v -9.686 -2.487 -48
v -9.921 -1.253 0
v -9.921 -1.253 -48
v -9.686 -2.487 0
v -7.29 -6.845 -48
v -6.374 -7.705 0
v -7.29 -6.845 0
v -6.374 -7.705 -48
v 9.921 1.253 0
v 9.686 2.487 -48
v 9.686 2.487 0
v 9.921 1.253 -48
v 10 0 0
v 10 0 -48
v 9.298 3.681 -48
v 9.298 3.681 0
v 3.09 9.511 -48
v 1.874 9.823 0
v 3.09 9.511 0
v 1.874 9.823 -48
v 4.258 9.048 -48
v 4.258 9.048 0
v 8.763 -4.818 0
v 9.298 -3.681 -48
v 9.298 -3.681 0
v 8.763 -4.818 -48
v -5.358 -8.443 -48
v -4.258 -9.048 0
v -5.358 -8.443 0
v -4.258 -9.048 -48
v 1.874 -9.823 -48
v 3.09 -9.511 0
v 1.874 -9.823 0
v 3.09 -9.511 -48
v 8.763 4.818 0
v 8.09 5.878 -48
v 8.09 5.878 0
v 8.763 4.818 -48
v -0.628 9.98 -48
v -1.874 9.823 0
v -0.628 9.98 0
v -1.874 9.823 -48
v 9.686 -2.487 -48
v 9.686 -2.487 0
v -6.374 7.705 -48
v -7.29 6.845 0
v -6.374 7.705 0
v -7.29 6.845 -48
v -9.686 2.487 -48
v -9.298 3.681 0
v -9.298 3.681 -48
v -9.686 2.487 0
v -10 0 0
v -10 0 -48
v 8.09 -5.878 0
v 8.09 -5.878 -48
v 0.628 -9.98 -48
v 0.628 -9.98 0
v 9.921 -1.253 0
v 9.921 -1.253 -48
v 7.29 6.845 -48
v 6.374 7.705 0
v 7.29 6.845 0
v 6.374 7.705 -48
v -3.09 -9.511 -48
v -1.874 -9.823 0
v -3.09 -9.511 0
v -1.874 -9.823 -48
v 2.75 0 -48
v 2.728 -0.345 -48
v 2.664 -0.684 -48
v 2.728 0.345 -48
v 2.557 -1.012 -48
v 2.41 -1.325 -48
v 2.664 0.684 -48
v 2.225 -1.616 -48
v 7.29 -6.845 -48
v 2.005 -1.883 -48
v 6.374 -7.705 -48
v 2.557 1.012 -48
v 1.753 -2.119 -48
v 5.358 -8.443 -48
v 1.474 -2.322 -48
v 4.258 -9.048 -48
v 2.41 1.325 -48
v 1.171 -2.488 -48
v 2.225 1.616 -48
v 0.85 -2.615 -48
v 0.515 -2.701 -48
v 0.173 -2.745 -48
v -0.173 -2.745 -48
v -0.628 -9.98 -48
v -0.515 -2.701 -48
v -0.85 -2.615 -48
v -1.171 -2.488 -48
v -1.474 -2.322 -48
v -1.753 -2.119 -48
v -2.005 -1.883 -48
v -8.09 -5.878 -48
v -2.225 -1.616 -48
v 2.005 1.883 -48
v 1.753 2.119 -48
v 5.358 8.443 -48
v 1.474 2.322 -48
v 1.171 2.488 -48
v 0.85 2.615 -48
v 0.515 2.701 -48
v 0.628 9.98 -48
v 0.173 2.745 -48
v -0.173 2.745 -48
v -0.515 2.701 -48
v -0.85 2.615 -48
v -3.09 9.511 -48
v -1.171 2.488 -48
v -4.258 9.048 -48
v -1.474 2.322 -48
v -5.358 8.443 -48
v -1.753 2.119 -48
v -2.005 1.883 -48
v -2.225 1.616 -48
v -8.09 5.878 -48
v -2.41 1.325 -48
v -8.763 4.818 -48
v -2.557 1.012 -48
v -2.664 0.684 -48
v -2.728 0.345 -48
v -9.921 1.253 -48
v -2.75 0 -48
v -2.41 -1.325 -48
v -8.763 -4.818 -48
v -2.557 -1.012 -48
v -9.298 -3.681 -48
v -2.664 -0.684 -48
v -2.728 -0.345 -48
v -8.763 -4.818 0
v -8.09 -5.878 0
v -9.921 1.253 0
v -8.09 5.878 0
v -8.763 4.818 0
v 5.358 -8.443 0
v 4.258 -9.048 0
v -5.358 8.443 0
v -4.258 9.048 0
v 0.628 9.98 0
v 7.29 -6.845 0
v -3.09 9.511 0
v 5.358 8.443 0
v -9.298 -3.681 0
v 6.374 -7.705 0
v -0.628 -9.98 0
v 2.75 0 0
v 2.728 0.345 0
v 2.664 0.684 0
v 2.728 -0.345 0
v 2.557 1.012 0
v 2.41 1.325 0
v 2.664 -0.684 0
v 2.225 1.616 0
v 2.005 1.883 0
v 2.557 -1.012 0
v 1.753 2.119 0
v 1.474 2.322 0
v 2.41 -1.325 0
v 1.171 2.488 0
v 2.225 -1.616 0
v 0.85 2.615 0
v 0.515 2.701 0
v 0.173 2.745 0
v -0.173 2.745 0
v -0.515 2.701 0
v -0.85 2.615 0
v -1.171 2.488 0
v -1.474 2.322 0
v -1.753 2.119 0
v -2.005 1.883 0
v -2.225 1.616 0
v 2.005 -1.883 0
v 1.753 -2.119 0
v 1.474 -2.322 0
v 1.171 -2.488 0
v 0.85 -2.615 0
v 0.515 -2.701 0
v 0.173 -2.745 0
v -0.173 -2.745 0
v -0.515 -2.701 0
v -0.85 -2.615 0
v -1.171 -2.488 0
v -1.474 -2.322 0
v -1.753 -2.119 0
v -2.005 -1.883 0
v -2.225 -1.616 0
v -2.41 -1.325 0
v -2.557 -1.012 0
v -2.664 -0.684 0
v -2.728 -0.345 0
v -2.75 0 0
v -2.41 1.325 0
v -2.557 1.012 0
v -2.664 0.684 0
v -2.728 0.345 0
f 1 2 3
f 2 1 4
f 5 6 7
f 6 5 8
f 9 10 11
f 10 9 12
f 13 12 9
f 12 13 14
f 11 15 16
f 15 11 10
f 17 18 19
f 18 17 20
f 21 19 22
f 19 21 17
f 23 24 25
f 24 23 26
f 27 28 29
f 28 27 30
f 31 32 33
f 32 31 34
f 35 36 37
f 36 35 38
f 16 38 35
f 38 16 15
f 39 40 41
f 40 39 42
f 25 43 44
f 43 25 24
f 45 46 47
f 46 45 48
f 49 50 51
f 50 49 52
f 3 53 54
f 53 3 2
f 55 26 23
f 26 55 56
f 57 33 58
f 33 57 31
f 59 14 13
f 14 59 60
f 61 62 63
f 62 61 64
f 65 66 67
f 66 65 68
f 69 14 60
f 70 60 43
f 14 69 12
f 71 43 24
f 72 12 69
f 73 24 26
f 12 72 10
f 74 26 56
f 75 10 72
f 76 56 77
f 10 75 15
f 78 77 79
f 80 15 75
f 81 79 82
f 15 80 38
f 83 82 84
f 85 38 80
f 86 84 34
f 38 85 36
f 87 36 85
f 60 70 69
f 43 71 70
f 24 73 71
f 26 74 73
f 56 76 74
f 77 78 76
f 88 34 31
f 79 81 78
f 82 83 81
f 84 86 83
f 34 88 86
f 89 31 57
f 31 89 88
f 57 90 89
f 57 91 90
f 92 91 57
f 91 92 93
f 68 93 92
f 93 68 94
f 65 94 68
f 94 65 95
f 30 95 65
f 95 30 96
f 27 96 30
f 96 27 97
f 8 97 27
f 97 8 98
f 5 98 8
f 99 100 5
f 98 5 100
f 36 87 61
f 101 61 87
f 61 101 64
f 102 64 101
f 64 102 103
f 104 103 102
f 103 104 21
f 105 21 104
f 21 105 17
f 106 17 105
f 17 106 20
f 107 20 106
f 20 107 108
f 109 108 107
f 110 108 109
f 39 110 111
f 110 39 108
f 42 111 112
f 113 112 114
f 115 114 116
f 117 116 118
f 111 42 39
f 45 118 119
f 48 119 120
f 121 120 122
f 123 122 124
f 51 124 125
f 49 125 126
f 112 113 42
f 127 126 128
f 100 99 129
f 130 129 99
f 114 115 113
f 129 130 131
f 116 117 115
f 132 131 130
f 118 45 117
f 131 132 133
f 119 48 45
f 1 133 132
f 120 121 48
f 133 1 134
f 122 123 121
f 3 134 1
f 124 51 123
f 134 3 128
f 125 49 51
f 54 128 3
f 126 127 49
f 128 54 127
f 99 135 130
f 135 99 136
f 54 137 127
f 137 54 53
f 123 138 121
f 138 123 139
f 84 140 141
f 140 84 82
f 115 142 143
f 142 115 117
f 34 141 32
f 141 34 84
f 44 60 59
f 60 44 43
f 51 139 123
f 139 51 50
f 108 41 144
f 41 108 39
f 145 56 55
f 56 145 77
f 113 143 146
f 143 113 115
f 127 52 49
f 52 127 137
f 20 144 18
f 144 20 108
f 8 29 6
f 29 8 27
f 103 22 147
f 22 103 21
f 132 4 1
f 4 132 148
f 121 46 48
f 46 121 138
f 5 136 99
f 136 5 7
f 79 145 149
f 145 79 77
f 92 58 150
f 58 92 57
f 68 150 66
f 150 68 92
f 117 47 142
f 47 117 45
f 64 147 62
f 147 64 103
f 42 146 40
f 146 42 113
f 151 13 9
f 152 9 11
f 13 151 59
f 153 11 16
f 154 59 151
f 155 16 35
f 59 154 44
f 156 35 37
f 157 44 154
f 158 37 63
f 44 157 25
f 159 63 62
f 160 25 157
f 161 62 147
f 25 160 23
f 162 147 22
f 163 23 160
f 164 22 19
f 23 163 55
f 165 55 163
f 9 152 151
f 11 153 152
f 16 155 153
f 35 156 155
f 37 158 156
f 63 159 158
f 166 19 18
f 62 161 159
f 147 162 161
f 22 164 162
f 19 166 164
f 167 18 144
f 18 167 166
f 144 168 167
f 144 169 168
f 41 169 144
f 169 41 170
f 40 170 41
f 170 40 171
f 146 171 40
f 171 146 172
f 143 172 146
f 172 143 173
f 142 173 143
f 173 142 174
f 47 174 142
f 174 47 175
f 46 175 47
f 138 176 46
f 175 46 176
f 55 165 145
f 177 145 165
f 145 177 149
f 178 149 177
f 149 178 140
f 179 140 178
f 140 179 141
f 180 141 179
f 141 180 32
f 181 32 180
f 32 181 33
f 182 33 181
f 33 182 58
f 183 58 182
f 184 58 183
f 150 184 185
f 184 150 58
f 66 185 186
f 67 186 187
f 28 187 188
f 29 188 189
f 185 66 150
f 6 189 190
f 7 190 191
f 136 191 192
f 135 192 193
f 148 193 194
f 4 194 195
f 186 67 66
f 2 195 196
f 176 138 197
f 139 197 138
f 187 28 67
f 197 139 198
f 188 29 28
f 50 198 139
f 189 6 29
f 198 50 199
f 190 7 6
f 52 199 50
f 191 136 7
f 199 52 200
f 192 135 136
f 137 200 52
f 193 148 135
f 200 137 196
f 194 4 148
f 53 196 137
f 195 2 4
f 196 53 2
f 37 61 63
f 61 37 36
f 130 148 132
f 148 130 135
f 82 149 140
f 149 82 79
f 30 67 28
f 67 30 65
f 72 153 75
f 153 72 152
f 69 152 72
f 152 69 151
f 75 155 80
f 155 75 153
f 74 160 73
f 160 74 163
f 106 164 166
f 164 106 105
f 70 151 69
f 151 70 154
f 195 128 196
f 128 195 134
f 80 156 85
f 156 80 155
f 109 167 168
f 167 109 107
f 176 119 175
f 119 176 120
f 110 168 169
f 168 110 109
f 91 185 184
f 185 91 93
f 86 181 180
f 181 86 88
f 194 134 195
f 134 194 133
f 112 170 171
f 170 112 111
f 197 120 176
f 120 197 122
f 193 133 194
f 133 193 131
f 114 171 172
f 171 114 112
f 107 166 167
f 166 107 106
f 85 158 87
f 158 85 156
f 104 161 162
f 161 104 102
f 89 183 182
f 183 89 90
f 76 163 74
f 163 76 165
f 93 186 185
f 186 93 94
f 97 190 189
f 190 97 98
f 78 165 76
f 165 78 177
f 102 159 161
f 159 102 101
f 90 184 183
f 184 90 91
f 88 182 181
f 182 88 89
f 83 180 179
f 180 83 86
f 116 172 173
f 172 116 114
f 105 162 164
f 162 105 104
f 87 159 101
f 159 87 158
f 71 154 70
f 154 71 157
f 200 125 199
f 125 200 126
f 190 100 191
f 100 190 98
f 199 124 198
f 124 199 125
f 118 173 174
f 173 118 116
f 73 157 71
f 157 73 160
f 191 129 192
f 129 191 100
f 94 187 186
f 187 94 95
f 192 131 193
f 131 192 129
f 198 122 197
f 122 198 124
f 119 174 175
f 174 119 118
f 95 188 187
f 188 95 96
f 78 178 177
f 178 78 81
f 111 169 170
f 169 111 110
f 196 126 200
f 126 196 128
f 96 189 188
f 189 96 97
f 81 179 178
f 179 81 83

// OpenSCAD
$fn = 50;


difference() {
	union() {
		translate(v = [0, 0, -48.0000000000]) {
			cylinder(h = 48, r = 10.0000000000);
		}
		cylinder(h = 0, r = 13.0000000000);
	}
	union() {
		#translate(v = [0, 0, -48]) {
			cylinder(h = 48, r = 2.7500000000);
		}
	}
}
